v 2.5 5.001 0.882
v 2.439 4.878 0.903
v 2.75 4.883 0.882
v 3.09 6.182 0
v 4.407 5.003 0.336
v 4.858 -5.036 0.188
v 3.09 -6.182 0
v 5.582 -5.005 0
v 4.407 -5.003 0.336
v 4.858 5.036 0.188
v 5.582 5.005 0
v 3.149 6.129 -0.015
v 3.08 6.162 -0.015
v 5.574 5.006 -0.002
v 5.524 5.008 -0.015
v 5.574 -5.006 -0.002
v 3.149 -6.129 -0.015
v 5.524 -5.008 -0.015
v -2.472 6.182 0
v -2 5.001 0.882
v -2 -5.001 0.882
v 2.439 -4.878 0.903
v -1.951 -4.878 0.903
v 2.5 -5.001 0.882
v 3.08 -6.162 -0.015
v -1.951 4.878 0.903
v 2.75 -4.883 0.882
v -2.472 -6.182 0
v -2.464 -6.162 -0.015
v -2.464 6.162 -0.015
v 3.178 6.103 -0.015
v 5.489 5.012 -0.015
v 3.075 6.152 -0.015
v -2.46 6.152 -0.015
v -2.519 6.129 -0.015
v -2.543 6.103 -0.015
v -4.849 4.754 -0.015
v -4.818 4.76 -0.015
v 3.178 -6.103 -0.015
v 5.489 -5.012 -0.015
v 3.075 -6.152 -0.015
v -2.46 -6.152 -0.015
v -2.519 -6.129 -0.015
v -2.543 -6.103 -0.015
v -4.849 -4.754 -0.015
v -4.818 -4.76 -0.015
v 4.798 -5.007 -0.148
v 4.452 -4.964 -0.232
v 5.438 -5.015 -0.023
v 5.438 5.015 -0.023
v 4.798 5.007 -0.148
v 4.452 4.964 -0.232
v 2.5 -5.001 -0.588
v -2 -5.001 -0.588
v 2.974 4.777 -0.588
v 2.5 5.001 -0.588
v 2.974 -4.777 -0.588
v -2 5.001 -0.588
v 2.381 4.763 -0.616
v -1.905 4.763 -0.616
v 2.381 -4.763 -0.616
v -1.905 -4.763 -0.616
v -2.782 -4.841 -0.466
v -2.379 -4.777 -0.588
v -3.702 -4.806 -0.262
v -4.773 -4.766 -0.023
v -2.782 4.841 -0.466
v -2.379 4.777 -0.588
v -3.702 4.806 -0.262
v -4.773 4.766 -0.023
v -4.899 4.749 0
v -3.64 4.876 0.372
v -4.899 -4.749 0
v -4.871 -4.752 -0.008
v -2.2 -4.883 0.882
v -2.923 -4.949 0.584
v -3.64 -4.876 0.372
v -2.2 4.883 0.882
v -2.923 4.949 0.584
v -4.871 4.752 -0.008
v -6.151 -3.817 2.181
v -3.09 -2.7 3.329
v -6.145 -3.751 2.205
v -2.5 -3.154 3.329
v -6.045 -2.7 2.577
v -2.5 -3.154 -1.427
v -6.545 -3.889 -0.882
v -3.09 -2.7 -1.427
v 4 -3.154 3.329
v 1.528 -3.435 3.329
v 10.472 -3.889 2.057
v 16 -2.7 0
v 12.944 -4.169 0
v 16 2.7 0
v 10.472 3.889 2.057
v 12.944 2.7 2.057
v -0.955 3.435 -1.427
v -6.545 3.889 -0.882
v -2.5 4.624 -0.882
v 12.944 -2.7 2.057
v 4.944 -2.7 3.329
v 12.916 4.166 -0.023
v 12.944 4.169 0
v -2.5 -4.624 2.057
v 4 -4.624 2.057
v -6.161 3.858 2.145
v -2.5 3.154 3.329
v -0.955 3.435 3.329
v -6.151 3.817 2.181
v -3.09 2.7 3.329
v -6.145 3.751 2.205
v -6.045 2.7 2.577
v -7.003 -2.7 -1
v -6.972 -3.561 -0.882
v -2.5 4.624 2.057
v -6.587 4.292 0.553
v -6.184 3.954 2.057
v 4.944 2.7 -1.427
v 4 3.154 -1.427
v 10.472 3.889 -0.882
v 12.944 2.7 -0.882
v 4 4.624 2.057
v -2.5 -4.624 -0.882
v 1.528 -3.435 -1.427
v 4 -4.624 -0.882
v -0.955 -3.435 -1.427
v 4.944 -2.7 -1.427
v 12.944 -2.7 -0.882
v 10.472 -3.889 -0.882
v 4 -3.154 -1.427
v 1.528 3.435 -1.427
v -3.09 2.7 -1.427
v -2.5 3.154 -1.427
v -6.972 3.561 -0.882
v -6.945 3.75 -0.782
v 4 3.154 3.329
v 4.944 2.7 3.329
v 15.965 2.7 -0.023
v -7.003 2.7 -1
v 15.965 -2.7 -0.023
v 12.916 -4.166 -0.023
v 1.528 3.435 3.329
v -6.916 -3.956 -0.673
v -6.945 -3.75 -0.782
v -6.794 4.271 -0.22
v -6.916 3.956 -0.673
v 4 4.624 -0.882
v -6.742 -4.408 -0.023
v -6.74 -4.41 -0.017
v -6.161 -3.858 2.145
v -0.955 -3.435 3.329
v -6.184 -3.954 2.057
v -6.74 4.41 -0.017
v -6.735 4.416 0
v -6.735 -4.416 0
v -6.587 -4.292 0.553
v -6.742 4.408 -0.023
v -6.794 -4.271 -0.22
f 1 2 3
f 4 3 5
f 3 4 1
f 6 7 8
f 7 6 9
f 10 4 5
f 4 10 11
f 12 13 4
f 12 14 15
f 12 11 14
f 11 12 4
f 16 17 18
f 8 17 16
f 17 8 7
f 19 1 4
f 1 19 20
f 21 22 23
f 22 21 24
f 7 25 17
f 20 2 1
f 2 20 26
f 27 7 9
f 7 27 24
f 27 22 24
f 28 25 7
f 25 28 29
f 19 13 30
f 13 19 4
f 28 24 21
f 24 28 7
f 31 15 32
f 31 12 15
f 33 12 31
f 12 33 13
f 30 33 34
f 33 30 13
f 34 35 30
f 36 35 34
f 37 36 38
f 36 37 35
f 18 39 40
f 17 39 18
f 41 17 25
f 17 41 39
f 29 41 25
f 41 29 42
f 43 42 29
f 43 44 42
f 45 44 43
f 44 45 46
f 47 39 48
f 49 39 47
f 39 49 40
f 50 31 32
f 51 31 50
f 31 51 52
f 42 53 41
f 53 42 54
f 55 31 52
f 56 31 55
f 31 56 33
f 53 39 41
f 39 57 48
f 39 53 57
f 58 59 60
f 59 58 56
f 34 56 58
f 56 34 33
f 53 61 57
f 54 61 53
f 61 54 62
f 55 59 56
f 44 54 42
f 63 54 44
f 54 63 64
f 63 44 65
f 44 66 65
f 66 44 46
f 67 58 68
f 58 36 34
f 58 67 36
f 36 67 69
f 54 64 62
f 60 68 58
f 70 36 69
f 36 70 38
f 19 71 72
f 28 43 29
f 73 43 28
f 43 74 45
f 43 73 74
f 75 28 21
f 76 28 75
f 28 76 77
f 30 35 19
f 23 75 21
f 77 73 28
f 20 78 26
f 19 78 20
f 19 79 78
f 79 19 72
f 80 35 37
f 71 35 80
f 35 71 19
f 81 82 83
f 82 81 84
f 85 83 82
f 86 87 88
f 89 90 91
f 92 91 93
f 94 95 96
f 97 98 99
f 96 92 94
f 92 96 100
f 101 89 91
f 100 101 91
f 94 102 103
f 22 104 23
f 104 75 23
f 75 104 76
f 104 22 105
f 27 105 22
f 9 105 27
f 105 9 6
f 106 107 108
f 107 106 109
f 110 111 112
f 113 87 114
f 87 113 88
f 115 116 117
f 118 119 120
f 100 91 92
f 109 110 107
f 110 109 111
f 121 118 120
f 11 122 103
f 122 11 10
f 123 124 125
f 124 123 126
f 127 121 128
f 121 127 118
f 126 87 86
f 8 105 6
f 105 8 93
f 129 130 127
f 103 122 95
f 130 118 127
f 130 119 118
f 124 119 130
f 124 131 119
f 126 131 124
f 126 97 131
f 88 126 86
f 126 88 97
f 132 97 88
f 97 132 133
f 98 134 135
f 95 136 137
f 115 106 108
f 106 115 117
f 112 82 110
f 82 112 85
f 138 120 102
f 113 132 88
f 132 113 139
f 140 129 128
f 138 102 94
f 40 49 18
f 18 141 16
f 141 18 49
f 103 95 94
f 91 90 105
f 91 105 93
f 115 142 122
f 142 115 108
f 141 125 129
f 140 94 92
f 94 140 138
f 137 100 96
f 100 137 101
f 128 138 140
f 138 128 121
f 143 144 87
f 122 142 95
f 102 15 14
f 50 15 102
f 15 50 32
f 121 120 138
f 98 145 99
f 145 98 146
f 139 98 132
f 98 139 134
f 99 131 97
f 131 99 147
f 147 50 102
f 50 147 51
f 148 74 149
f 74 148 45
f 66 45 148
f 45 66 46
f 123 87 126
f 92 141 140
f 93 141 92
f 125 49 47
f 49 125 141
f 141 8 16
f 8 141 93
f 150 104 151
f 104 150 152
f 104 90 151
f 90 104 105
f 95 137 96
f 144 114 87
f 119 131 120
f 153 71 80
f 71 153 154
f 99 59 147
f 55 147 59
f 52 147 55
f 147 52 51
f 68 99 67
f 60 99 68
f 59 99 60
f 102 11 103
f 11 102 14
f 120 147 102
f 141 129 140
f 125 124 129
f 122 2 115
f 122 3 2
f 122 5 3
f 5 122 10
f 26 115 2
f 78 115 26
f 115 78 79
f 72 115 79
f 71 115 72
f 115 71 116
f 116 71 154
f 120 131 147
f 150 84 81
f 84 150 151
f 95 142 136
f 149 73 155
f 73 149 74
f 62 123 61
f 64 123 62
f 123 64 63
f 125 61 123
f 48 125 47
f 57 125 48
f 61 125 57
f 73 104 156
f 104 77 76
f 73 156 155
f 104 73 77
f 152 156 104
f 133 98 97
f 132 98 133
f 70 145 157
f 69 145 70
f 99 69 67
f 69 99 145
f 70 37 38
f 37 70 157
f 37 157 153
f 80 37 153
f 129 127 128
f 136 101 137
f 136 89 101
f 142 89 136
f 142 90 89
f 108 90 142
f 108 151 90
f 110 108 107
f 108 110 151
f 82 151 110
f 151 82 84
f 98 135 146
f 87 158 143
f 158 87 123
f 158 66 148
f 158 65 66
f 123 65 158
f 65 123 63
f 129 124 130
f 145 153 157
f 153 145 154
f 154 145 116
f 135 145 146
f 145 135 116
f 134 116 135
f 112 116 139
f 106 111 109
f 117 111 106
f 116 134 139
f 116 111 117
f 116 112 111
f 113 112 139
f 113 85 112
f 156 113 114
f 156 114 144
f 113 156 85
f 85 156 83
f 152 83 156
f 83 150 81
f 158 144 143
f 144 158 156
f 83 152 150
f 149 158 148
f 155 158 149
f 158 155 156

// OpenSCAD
// file: ../lib/util.scad
fn1 = 32;
fn2 = 16;

module util_half_sphere(radius, fn=fn1) {
    difference() {
        sphere(radius, $fn=fn);
        translate([0,0,-(radius+radius/19)])
            cube(2*radius+radius/10, center=true);
    }
}

function gcd(a,b) = a == b ? a : a > b ? gcd(a-b, b) : gcd(a, b-a);

module util_saucer(length, width, height, fn=fn1) {
    rad = gcd(length,gcd(width,height));
    //rad = 10;
    scale([length/(2*rad), width/(2*rad), height/rad])
        util_half_sphere(rad, fn);
}

module util_half_cylinder(length, radius, inner_fn=fn2, outer_fn=fn1) {
    maxval = max(length, 2*radius);
    intersection() {
        difference() {
            rotate([0,90,0])
                translate([0,0,-(length/2 + length/20)])
                    cylinder(length+length/10, radius, radius, $fn=inner_fn);
            
            translate([0,0,(maxval/2 + maxval/19)])
                cube(maxval+maxval/10, center=true);
        }
        
        translate([0,0,-(radius+radius/20)])
            cylinder(radius + radius/10, length/2, length/2, $fn=outer_fn);
    }
}

module util_body(length, width, height, upper_height, fn=fn1) {
    rad = gcd(length, gcd(width, upper_height));
    
    scale(.995) scale([length/(2*rad), width/(2*rad), 1])
        util_half_cylinder(2*rad, height, outer_fn=fn);
}

module util_graded_cylinder(height, radius_start, radius_end, grades=1, fn=fn1) {
    height_grade = height / grades;
    radius_grade = (radius_start - radius_end) / (grades * grades);
    for (i = [0 : 1 : grades]) {
        translate([0,0,i*height_grade])
            cylinder(height_grade, 
                     radius_start - i*radius_grade * i,
                     radius_start - (i+1) * radius_grade * (i+1),
                     $fn = fn);
    }
}

module util_nacelle(length, width, height, curved=false, up=true, front_bulge=false) {
    rad = min(width, height/2);
    grads = curved ? 6 : 1;
    scale_factor = front_bulge ? 1.1 : 1;
    direction = up ? -1 : 1;
    difference() {
        scale([1, width/ (2*rad), height/rad])
            difference() {
                union() {
                    rotate([0,-90,0])
                        rotate(30)
                            util_graded_cylinder(length-rad, rad, rad/2, grads, 6);
                    scale(scale_factor) 
                        rotate([0,90,0]) rotate(90) sphere(rad, $fn=6);
                }
                
                translate([-length/2, 0, direction * (height/2 + height/19)])
                    cube([length+length, width+width, height+height/10], center=true);
            }
        
        translate([-length-(curved?length/3:0), 0, -length/3])
            rotate([0,-45,0])
                cube(length, center=true);
    }
}

module util_mirrored(v) {
    children();
    mirror(v) children();
}

module util_ring(outer, inner, height) {
    difference() {
        translate([0,0,-height/2])
            cylinder(height, outer, outer);
        translate([0,0,-(height/2 + height/19)])
            cylinder(height+height/10, inner, inner);
    }
}

module util_star(radius, thick, num, half=false) {
    angle = 360/num;
    offset = half? angle/2 : 0;
    for (i = [0: 1: num]) {
        rotate(i* angle + offset)
            translate([radius/2,0,0])
                cube([radius, thick, thick], center=true);
    }
}

module util_ring_star(radius, thick, num, inner, half=false) {
    outer=inner+thick;
    avg = (inner + outer)/2;
    union() {
        difference() {
            util_star(radius, thick, num, half);
            cylinder(2*thick, outer, outer, $fn=num, center=true);
        }
        util_ring(outer, inner, thick);
    }
}

module util_hangar_disk(height, lower, upper, num, fn=fn1) {
    difference() {
            cylinder(height, lower, upper, $fn=fn, center=true);
        difference() {
            scale([1,1,22])
                util_star(1.1*upper, height/20, num, half=true);
            scale(.95)
                cylinder(height, lower, upper, $fn=fn, center=true);
        }
    }
}

module util_hangar_form(length, width, height, num, inner=0) {
    l = 0.6* max(length, width);
    h = 2.5* height;
    thick = min(height/20,1);
    inner = inner == 0 ? l/3 : inner;
    difference() {
        children();
        scale([1,1,h/thick]) 
            util_ring_star(l, thick, num, inner, half=true);
    }
    scale(.95) children();
}

module util_nacelle_bar(span, height, width, thickness) {
    rad = (span*span/(8*height) + height/2);
    outer = rad + thickness/2;
    inner = rad - thickness/2;
    difference(){
        translate([0,0,outer])
            rotate([0,90,0])
                util_ring(outer, inner, width);
    
        translate([0,0,1.1*outer+height])
            cube(2.2*outer, center=true);
    }
}

module util_q_sphere(rad, quadrant, faces) {
    x_sign = quadrant == 1 ? 1 :
             quadrant == 2 ? -1 :
             quadrant == 3 ? -1 :
             quadrant == 4 ? 1 : 0;
    z_sign = quadrant == 1 ? 1 :
             quadrant == 2 ? 1 :
             quadrant == 3 ? -1 :
             quadrant == 4 ? -1 : 0;
    
    difference() {
        sphere(rad, $fn=faces);

        translate([x_sign*(-1.1*rad - .01),0,0])
        cube(2.2*rad, center=true);

        translate([0,0,z_sign*(-1.1*rad - .01)])
        cube(2.2*rad, center=true);
    }
}

module util_ovoid(front_rad, back_rad, width, upper_rad, lower_rad, faces=32) {
    half_width = width/2;
    largest=max(front_rad, back_rad, half_width, upper_rad, lower_rad);
    smallest=min(front_rad, back_rad, half_width, upper_rad, lower_rad);
    
    union() {
        scale([front_rad/smallest, half_width/smallest, upper_rad/smallest])
        util_q_sphere(smallest, 1, faces);
        
        scale([front_rad/smallest, half_width/smallest, lower_rad/smallest])
        util_q_sphere(smallest, 4, faces);
        
        scale([back_rad/smallest, half_width/smallest, lower_rad/smallest])
        util_q_sphere(smallest, 3, faces);
        
        scale([back_rad/smallest, half_width/smallest, upper_rad/smallest])
        util_q_sphere(smallest, 2, faces);
    }
}
// main file
use <../lib/util.scad>;

module runabout() {
    difference() {
        union() {
            hull()
            util_mirrored([0,1,0])
            translate([0,2.7,0])
            util_ovoid(16,10,5,3.5,1.5, faces=10);
            
            util_ovoid(10,8,13,1.5,1,faces=10);
        }

        translate([-15/2-7,0,0])
        rotate([0,15,0])
        cube(15,center=true);
    }
}

runabout();
